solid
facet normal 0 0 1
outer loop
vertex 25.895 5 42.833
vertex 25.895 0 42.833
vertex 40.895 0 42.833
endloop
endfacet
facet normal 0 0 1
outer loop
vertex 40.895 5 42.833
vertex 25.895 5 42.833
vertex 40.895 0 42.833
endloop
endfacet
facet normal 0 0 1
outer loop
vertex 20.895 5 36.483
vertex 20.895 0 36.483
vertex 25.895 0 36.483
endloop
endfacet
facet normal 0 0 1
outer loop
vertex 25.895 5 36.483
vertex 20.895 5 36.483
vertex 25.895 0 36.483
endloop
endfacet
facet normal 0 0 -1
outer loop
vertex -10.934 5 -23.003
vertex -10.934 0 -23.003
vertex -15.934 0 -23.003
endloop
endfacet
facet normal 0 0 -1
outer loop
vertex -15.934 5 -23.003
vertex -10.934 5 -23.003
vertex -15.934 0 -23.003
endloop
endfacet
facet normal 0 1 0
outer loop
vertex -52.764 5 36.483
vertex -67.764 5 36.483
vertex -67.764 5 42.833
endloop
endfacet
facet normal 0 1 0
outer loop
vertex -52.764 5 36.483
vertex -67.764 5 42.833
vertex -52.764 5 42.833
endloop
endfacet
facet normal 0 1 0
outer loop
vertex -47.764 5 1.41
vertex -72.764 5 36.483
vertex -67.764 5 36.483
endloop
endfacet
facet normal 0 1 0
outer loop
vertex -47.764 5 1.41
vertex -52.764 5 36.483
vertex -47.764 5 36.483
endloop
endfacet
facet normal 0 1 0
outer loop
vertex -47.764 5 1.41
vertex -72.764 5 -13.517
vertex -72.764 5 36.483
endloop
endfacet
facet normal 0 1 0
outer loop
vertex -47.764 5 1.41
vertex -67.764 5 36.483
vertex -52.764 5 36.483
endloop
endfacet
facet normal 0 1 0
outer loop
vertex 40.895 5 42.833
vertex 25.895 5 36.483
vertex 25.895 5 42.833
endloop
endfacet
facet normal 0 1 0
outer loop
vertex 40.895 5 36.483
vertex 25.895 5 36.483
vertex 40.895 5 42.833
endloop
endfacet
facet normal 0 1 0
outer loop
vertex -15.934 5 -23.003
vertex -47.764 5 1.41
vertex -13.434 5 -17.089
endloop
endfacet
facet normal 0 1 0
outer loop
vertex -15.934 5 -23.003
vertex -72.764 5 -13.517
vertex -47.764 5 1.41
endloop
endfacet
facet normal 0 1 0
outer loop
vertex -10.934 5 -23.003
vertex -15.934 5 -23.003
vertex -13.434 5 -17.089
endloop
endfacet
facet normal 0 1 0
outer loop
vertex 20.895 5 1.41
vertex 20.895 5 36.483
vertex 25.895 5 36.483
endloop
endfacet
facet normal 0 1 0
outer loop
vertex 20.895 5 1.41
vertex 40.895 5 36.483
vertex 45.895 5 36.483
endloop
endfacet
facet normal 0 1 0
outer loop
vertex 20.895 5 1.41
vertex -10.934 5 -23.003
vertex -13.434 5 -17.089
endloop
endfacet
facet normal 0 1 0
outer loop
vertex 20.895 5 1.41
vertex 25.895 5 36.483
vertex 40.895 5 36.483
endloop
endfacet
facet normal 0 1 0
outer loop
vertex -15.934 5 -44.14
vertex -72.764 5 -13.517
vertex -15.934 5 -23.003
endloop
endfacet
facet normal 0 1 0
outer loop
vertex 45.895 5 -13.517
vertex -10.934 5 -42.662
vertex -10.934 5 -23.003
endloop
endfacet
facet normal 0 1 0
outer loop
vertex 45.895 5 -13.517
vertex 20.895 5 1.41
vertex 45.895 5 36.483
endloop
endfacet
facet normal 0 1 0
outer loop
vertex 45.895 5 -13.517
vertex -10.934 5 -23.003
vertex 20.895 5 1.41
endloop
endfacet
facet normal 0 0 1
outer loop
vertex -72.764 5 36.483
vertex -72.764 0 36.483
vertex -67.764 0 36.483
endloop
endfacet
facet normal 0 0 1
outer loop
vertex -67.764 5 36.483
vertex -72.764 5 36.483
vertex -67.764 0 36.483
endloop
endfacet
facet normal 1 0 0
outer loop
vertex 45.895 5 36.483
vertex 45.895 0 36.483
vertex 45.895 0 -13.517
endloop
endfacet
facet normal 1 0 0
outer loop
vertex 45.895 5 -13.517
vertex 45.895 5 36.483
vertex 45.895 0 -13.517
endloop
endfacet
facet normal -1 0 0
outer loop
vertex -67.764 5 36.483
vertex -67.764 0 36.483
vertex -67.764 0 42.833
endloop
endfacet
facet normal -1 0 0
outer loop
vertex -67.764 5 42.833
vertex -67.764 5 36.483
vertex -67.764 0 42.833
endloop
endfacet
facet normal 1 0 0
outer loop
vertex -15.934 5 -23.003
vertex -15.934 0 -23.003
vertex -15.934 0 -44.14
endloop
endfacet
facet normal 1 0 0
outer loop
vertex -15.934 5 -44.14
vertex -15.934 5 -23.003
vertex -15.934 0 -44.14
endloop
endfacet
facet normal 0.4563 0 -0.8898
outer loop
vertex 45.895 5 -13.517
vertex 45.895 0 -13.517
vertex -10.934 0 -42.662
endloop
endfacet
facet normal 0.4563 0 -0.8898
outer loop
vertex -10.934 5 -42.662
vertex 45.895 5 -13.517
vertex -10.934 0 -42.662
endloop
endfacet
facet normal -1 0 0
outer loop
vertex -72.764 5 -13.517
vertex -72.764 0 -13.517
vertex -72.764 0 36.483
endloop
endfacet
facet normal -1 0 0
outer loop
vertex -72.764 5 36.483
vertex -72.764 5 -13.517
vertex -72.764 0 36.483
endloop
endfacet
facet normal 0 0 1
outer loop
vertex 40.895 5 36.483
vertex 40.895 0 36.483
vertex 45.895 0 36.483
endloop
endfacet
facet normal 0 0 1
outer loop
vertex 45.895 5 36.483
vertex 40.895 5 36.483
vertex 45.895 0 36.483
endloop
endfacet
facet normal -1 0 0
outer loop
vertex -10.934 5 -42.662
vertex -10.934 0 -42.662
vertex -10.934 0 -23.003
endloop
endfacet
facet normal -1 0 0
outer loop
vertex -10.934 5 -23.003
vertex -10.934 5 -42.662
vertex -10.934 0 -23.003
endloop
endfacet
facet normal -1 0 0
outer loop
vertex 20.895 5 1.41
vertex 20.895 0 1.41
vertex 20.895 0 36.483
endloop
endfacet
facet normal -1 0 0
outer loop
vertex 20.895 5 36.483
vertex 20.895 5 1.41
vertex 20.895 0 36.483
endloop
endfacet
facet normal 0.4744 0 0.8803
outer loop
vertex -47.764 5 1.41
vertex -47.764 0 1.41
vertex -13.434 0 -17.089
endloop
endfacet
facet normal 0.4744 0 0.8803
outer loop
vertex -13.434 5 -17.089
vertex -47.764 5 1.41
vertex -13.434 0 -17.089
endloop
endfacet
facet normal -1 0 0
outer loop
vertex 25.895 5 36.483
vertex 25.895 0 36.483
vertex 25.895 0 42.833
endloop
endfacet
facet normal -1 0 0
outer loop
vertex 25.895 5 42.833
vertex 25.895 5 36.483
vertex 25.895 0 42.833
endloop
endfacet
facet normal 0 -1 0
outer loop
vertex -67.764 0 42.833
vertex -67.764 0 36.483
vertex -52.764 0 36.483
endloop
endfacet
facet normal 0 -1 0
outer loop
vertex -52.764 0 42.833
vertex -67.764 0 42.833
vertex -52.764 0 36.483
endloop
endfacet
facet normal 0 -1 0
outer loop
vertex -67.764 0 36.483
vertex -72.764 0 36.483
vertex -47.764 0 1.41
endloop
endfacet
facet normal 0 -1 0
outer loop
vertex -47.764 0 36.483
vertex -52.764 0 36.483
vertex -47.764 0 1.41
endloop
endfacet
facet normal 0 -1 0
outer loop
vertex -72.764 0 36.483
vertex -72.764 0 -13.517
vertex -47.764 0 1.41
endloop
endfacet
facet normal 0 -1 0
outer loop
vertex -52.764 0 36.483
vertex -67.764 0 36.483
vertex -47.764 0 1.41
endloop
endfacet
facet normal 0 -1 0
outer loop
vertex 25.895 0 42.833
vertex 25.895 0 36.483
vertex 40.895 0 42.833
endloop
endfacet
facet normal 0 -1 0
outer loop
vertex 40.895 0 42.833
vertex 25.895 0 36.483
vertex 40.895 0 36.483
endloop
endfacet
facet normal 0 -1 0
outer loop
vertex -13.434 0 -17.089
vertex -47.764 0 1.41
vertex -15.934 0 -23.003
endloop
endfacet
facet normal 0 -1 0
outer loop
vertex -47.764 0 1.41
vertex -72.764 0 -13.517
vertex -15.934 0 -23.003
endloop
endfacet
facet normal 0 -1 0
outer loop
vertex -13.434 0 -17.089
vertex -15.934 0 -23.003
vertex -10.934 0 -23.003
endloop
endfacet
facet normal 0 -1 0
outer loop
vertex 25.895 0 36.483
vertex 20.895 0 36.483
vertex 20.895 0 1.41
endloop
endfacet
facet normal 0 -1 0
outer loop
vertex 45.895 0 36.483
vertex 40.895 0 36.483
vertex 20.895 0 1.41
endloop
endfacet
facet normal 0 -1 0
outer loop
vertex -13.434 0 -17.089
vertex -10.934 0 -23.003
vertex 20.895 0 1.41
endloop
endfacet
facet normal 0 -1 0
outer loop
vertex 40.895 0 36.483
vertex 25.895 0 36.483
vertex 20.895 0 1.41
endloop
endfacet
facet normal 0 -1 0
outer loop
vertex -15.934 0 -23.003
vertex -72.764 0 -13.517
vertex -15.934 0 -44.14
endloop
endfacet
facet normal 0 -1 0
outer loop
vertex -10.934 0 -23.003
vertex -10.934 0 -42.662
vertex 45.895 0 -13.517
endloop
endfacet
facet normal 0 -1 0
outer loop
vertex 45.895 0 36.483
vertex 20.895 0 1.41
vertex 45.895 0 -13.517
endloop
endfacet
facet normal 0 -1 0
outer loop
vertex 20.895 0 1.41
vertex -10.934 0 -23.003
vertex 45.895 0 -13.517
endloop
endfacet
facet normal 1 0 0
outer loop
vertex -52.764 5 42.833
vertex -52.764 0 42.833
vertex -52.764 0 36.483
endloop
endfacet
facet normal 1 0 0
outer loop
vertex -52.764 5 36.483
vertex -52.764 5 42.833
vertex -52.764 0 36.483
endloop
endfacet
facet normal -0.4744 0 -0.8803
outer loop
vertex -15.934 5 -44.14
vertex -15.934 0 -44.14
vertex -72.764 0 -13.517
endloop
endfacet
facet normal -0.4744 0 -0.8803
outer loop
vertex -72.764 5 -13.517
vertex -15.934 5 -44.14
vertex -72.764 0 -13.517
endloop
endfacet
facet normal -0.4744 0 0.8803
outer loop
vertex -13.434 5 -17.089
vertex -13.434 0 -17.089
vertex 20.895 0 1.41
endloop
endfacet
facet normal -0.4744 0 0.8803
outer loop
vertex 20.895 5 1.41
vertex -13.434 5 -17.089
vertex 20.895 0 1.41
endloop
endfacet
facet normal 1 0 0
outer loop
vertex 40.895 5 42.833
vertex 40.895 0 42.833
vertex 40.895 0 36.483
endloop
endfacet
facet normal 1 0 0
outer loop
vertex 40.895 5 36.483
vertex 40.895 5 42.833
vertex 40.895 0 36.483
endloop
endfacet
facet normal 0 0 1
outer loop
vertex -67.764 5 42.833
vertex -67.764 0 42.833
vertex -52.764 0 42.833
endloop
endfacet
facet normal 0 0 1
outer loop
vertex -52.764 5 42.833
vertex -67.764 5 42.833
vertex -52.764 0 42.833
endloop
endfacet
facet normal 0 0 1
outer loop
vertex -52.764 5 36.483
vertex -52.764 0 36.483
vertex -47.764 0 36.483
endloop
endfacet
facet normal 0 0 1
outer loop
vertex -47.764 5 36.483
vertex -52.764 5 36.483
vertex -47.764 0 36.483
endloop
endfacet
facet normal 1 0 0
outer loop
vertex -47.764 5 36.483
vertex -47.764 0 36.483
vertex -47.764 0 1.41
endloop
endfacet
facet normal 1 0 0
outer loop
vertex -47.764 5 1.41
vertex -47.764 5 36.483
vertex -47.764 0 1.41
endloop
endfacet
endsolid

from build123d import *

# Parameters (mm, degrees)
BOSS_EXTRUDE1_DEPTH = 5


with BuildPart() as part:
    # Sketch1 → Boss-Extrude1 (new body)
    with BuildSketch(Plane(origin=(0, 0, 0), x_dir=(1, 0, 0), z_dir=(0, 1, 0))):
        Polygon((-72.763800855, -36.482591992), (-67.763800855, -36.482591992), (-67.763800855, -42.832591992), (-52.763800855, -42.832591992), (-52.763800855, -36.482591992), (-47.763800855, -36.482591992), (-47.763800855, -1.40972798), (-13.434360787, 17.088978271), (20.89507928, -1.40972798), (20.89507928, -36.482591992), (25.89507928, -36.482591992), (25.89507928, -42.832591992), (40.89507928, -42.832591992), (40.89507928, -36.482591992), (45.89507928, -36.482591992), (45.89507928, 13.517408008), (-10.934360787, 42.661627557), (-10.934360787, 23.003270856), (-15.934360787, 23.003270856), (-15.934360787, 44.14042767), (-72.763800855, 13.517408008), align=None)
    extrude(amount=BOSS_EXTRUDE1_DEPTH)


solid = part.part
